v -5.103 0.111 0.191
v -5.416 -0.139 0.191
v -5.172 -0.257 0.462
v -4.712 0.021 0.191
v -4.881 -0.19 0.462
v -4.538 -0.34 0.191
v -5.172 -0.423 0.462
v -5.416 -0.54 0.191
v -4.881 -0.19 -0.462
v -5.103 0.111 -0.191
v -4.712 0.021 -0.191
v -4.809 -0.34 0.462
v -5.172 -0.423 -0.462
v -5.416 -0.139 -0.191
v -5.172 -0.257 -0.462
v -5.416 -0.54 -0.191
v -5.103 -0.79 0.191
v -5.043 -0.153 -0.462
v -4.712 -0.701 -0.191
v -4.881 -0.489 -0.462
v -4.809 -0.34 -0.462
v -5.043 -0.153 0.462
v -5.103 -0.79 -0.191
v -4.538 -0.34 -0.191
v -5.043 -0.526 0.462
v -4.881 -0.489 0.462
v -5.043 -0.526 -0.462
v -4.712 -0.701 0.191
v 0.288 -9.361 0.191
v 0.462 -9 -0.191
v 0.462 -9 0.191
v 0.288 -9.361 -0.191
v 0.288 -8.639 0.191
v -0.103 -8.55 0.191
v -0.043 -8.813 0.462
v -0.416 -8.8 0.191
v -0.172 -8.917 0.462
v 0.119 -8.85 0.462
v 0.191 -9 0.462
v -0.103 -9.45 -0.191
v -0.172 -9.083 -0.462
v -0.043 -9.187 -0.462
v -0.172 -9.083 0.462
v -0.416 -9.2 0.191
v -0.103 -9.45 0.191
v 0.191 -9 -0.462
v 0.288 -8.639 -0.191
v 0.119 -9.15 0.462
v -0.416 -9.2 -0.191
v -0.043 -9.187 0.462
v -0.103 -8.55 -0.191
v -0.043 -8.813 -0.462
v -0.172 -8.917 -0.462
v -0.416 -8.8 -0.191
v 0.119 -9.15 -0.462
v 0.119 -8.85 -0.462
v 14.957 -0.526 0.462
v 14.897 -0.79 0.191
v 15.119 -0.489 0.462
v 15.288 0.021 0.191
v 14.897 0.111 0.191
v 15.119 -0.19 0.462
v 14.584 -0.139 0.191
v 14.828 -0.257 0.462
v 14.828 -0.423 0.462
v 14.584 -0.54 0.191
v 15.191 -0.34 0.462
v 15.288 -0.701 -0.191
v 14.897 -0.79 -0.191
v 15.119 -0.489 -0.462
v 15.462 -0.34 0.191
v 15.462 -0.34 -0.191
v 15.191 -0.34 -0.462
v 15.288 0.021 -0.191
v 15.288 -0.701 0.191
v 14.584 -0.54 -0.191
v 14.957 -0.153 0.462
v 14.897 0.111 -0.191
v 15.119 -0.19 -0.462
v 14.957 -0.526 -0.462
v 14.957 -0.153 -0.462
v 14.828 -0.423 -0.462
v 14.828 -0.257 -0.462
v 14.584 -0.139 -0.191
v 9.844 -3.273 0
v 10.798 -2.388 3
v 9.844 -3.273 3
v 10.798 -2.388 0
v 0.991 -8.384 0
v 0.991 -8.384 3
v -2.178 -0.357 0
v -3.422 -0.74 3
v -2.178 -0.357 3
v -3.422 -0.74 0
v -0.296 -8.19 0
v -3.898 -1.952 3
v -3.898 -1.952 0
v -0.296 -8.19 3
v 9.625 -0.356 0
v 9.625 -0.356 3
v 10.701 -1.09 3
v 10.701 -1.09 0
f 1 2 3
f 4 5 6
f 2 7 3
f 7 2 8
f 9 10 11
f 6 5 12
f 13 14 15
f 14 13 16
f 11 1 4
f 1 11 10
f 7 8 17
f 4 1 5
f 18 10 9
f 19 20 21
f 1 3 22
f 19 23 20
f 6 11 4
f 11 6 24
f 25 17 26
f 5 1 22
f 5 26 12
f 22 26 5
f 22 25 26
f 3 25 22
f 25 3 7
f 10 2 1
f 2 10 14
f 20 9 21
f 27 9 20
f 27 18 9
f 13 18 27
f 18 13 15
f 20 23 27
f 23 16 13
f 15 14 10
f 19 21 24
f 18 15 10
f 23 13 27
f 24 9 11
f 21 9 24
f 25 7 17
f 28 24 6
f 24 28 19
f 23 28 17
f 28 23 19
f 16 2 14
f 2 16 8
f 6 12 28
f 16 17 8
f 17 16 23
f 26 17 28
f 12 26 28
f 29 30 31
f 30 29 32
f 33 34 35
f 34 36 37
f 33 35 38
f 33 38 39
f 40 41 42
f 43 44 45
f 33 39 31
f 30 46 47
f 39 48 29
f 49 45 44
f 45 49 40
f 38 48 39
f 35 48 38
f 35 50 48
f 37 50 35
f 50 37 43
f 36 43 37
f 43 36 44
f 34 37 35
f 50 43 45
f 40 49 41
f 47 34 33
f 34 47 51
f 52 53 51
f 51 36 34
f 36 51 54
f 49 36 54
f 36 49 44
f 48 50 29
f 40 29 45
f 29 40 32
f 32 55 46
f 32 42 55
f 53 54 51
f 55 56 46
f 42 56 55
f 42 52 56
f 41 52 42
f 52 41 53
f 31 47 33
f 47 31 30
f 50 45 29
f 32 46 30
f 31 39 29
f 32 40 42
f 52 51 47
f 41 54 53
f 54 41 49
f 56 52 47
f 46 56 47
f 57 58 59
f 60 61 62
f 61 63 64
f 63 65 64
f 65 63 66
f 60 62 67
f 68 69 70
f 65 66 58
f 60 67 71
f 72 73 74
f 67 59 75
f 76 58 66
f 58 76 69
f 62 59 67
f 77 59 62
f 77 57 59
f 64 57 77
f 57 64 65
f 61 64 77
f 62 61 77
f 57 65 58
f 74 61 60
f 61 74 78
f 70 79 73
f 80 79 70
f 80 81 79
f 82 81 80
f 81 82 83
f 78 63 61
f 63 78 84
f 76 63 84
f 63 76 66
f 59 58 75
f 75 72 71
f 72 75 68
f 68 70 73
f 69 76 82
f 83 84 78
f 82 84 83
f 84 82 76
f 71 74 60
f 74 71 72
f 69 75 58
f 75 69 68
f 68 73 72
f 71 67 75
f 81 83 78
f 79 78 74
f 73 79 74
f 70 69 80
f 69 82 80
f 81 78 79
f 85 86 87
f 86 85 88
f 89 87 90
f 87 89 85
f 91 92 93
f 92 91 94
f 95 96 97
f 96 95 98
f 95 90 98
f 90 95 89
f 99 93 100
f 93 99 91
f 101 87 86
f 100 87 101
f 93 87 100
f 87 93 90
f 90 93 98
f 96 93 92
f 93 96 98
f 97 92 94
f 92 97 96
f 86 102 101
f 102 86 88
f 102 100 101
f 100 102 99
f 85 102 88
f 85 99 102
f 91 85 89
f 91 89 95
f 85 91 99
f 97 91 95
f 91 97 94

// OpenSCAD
$fn=7;
union()
{
	union()
	{
		translate([-4.999999,-0.33974743,0])
		{
			rotate(0,[0,0,1])
			{
				sphere(d=1);
			}
		}
		translate([0,-9,0])
		{
			rotate(0,[0,0,1])
			{
				sphere(d=1);
			}
		}
		translate([14.999999,-0.33974648,0])
		{
			rotate(0,[0,0,1])
			{
				sphere(d=1);
			}
		}
	}
	hull()
	{
		translate([-2.4019232,-1.8397472,0])
		{
			rotate(30.000006,[0,0,1])
			{
				cylinder(h=3,d=3);
			}
		}
		translate([0.549038,-6.950962,0])
		{
			rotate(30.000006,[0,0,1])
			{
				cylinder(h=3,d=3);
			}
		}
		translate([9.401922,-1.8397467,0])
		{
			rotate(30.000006,[0,0,1])
			{
				cylinder(h=3,d=3);
			}
		}
	}
}
